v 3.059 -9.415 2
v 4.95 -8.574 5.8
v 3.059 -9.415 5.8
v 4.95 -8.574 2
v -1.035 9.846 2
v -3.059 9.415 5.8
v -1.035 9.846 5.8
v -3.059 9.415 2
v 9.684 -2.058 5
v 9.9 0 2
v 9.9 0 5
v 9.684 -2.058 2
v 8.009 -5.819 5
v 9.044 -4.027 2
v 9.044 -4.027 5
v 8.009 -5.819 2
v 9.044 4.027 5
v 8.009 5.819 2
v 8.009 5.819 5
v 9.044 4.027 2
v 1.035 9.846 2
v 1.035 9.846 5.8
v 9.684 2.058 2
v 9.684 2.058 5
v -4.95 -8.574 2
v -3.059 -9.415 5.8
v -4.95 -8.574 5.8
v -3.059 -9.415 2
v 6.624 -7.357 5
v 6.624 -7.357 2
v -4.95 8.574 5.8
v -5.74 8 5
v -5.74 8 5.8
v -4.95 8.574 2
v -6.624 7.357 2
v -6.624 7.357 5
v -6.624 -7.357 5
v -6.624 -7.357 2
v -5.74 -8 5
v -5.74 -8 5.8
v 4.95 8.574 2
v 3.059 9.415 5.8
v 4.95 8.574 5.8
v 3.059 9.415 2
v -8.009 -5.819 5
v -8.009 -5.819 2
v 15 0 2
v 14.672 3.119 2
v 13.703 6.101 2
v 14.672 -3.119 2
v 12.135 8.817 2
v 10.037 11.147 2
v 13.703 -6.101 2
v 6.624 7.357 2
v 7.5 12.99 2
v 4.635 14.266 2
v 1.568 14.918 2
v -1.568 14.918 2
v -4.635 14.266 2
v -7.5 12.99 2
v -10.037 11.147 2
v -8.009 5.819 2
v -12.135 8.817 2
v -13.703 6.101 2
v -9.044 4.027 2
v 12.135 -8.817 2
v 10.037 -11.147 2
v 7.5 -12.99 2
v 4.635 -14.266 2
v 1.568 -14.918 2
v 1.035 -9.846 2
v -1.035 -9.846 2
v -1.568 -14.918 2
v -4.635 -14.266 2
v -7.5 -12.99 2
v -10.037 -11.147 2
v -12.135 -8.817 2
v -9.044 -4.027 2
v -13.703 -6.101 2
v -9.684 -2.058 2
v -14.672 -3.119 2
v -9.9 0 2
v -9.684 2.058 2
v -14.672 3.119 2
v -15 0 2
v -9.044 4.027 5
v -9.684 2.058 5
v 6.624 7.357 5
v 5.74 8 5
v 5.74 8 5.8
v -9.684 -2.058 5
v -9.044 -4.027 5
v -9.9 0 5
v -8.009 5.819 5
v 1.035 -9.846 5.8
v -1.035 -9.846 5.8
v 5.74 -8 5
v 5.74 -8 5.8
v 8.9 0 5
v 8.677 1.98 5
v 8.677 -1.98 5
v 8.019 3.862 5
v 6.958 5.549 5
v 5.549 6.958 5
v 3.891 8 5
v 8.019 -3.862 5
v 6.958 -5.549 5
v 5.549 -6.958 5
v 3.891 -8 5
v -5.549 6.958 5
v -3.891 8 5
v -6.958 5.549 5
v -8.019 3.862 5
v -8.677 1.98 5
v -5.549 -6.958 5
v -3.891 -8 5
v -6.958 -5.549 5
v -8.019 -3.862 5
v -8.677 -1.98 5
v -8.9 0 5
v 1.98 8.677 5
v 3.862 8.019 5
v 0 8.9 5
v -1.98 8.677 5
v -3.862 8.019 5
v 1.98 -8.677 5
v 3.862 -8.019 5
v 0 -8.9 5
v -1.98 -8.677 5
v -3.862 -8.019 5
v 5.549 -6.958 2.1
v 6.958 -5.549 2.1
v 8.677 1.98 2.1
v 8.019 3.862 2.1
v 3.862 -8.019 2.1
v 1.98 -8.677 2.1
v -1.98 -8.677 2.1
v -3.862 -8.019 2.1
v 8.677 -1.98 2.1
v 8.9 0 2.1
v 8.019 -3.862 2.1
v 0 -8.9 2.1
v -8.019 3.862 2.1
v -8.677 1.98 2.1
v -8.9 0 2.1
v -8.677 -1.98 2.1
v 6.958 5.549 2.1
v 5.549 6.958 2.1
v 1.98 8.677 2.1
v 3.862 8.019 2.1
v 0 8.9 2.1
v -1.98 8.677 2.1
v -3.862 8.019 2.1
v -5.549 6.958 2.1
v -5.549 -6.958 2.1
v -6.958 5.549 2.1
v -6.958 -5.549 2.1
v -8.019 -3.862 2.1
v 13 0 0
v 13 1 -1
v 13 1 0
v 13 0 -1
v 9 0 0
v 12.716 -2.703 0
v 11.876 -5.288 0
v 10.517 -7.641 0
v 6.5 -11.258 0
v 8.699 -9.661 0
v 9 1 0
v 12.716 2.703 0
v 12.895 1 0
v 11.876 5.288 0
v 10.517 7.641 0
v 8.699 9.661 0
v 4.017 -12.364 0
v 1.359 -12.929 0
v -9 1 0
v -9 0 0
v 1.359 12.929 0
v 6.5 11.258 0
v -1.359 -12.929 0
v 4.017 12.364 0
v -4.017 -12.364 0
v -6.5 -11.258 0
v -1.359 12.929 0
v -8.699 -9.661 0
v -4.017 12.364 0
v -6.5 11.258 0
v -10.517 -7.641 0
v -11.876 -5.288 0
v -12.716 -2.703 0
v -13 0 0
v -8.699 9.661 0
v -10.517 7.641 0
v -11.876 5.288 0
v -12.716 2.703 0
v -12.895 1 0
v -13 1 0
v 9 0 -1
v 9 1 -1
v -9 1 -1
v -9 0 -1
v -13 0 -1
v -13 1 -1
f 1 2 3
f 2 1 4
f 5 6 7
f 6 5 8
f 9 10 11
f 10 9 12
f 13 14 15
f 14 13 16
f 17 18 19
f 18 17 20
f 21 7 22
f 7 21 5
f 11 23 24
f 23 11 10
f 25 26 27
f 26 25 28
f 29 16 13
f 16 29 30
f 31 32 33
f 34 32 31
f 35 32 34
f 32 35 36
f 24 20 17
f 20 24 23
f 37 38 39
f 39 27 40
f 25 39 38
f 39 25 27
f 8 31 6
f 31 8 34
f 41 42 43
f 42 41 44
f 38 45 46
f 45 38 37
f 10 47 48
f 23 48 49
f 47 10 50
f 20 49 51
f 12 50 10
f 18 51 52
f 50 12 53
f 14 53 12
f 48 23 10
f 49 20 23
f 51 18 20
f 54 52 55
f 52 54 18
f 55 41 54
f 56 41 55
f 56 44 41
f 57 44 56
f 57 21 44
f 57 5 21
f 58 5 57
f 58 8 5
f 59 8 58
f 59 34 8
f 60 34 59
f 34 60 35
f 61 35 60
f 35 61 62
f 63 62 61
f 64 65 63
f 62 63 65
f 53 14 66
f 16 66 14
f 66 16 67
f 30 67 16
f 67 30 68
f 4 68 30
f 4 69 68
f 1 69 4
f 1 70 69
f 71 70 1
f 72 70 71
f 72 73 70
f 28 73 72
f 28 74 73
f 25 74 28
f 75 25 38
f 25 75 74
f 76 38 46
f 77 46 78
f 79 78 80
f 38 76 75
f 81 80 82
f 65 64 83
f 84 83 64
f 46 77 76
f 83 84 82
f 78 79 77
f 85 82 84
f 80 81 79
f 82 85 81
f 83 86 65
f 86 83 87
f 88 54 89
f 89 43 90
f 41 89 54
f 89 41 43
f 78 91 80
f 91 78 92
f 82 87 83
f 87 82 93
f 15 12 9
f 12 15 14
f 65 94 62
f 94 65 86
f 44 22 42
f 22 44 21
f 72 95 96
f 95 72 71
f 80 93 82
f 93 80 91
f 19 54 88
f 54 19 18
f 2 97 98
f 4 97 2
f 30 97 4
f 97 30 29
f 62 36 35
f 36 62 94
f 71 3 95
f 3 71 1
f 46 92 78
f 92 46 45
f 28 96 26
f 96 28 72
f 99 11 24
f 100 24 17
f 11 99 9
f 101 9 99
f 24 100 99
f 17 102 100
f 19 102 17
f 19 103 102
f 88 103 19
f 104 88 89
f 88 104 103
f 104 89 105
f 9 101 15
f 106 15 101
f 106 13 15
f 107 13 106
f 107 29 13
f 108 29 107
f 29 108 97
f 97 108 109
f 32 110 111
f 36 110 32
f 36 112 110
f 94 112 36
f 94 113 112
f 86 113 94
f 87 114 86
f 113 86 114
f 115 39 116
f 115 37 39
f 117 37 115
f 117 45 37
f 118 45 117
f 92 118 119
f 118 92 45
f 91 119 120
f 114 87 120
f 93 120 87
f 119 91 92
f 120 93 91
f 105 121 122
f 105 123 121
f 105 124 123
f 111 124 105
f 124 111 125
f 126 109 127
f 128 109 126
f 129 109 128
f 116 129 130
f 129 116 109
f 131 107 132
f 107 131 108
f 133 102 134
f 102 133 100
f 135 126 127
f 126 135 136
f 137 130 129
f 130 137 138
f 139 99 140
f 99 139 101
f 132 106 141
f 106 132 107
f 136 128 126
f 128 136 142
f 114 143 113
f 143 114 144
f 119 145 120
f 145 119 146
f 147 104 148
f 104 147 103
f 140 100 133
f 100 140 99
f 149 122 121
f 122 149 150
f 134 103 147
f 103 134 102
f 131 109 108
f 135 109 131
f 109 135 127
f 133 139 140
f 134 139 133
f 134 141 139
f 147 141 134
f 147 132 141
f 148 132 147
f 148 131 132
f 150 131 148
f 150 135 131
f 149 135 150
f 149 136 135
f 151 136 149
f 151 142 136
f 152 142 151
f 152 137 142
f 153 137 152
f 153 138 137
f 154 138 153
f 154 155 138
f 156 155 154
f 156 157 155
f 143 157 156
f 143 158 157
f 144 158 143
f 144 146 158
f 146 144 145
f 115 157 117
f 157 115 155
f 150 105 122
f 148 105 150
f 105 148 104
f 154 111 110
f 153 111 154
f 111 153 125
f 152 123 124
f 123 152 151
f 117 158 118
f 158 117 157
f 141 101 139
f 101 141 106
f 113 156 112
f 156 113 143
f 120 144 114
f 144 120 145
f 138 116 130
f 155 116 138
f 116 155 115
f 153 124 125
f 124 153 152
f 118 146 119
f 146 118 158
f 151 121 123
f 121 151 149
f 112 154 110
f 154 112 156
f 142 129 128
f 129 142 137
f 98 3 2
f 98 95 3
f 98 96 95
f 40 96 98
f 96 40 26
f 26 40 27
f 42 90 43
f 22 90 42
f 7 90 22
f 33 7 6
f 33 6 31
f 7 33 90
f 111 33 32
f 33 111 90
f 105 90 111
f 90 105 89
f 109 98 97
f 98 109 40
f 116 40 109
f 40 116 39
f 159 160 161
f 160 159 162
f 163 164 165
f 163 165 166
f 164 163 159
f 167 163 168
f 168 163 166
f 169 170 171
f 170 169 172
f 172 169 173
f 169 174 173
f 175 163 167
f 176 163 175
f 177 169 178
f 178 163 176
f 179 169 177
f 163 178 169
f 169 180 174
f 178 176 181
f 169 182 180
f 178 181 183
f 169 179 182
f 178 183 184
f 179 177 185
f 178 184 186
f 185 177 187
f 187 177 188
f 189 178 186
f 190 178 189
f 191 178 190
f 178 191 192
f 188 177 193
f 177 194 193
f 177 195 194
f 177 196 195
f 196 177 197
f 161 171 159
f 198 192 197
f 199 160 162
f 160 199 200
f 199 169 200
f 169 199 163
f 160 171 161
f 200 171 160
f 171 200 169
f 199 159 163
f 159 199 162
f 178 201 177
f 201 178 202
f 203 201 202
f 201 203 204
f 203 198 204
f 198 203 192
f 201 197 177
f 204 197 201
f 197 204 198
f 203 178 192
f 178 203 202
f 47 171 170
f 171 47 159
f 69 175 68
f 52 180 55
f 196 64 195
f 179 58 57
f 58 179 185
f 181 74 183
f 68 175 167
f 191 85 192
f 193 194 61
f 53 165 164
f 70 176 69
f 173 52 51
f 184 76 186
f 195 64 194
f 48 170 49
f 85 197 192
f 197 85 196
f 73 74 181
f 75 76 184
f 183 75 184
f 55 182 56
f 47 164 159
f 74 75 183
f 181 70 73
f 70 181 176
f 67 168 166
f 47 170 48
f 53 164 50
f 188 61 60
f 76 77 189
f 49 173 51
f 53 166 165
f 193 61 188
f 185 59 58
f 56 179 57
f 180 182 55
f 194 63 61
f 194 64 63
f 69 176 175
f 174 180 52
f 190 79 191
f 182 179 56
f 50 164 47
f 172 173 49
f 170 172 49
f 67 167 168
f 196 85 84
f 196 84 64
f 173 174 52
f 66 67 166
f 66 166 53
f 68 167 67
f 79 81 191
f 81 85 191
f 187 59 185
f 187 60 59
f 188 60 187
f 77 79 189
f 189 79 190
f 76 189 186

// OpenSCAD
module aro(h,r,grosor) {
    
    difference() {
        cylinder( h,r, r, false);                           
        translate([0,0,0.1]) cylinder( h+1,r-grosor, r-grosor, false);    
    }
    
}

module po(sizex,sizey,height=0.4) {    
difference() {
    resize([sizex,sizey,height])    
  surface(file = "drpo01.png", center = true, invert=false);
    
    translate([0,0,0.0])
 cube([sizex+0.1,sizey+0.1,0.1],true);
}
}

module po_inv(sizex,sizey,height=0.6) {    
    difference() {
        
    translate([0,0,height])
    resize([sizex,sizey,height])    
  surface(file = "drpo01.png", center = true, invert=true);
    
    
    translate([0,0,0.0])
 cube([sizex+0.1,sizey+0.1,0.1],true);
}
}




module agv() {
    center=true;
    hbase=2;
    dbase=30;
    rbase=dbase/2;
    
    hsup=3;
    dsup=19.8;
    rsup=dsup/2;
    
    //oreja
    translate([rbase-6 ,0,-1])
        cube( [4, 1, 1] );
    
    translate([-rbase+2 ,0,-1])
        cube( [4, 1, 1] );
    
    //po
    translate([0,0,0])   
     rotate([0,180,180])
        po_inv(20,15);            
    
    //base               
	translate([0,0,0])    
    cylinder( hbase,rbase-2, rbase, false);    
    
    
    
/*
    hull() {
    translate([0,0,0])
    cylinder( hbase,rbase, rbase, false);
    
    translate([0,0,-1])
        sphere(1,1);
    }
*/
    
    //sup
    grosor=1;    
    translate([0,0,hbase]) 
        aro(hsup, rsup, grosor);

      

	//tapa
	gtapa=0.8;
	w=16+10;
	d=16;
	hlat=hbase+hsup;
	
	difference() {

	translate([0,0,hlat]) 
		cylinder( gtapa,rsup, rsup, false);
	
   translate([-w/2,-d/2,hlat-1])
		cube([w,d,gtapa+2],false);

	}

	
  
}

agv();
